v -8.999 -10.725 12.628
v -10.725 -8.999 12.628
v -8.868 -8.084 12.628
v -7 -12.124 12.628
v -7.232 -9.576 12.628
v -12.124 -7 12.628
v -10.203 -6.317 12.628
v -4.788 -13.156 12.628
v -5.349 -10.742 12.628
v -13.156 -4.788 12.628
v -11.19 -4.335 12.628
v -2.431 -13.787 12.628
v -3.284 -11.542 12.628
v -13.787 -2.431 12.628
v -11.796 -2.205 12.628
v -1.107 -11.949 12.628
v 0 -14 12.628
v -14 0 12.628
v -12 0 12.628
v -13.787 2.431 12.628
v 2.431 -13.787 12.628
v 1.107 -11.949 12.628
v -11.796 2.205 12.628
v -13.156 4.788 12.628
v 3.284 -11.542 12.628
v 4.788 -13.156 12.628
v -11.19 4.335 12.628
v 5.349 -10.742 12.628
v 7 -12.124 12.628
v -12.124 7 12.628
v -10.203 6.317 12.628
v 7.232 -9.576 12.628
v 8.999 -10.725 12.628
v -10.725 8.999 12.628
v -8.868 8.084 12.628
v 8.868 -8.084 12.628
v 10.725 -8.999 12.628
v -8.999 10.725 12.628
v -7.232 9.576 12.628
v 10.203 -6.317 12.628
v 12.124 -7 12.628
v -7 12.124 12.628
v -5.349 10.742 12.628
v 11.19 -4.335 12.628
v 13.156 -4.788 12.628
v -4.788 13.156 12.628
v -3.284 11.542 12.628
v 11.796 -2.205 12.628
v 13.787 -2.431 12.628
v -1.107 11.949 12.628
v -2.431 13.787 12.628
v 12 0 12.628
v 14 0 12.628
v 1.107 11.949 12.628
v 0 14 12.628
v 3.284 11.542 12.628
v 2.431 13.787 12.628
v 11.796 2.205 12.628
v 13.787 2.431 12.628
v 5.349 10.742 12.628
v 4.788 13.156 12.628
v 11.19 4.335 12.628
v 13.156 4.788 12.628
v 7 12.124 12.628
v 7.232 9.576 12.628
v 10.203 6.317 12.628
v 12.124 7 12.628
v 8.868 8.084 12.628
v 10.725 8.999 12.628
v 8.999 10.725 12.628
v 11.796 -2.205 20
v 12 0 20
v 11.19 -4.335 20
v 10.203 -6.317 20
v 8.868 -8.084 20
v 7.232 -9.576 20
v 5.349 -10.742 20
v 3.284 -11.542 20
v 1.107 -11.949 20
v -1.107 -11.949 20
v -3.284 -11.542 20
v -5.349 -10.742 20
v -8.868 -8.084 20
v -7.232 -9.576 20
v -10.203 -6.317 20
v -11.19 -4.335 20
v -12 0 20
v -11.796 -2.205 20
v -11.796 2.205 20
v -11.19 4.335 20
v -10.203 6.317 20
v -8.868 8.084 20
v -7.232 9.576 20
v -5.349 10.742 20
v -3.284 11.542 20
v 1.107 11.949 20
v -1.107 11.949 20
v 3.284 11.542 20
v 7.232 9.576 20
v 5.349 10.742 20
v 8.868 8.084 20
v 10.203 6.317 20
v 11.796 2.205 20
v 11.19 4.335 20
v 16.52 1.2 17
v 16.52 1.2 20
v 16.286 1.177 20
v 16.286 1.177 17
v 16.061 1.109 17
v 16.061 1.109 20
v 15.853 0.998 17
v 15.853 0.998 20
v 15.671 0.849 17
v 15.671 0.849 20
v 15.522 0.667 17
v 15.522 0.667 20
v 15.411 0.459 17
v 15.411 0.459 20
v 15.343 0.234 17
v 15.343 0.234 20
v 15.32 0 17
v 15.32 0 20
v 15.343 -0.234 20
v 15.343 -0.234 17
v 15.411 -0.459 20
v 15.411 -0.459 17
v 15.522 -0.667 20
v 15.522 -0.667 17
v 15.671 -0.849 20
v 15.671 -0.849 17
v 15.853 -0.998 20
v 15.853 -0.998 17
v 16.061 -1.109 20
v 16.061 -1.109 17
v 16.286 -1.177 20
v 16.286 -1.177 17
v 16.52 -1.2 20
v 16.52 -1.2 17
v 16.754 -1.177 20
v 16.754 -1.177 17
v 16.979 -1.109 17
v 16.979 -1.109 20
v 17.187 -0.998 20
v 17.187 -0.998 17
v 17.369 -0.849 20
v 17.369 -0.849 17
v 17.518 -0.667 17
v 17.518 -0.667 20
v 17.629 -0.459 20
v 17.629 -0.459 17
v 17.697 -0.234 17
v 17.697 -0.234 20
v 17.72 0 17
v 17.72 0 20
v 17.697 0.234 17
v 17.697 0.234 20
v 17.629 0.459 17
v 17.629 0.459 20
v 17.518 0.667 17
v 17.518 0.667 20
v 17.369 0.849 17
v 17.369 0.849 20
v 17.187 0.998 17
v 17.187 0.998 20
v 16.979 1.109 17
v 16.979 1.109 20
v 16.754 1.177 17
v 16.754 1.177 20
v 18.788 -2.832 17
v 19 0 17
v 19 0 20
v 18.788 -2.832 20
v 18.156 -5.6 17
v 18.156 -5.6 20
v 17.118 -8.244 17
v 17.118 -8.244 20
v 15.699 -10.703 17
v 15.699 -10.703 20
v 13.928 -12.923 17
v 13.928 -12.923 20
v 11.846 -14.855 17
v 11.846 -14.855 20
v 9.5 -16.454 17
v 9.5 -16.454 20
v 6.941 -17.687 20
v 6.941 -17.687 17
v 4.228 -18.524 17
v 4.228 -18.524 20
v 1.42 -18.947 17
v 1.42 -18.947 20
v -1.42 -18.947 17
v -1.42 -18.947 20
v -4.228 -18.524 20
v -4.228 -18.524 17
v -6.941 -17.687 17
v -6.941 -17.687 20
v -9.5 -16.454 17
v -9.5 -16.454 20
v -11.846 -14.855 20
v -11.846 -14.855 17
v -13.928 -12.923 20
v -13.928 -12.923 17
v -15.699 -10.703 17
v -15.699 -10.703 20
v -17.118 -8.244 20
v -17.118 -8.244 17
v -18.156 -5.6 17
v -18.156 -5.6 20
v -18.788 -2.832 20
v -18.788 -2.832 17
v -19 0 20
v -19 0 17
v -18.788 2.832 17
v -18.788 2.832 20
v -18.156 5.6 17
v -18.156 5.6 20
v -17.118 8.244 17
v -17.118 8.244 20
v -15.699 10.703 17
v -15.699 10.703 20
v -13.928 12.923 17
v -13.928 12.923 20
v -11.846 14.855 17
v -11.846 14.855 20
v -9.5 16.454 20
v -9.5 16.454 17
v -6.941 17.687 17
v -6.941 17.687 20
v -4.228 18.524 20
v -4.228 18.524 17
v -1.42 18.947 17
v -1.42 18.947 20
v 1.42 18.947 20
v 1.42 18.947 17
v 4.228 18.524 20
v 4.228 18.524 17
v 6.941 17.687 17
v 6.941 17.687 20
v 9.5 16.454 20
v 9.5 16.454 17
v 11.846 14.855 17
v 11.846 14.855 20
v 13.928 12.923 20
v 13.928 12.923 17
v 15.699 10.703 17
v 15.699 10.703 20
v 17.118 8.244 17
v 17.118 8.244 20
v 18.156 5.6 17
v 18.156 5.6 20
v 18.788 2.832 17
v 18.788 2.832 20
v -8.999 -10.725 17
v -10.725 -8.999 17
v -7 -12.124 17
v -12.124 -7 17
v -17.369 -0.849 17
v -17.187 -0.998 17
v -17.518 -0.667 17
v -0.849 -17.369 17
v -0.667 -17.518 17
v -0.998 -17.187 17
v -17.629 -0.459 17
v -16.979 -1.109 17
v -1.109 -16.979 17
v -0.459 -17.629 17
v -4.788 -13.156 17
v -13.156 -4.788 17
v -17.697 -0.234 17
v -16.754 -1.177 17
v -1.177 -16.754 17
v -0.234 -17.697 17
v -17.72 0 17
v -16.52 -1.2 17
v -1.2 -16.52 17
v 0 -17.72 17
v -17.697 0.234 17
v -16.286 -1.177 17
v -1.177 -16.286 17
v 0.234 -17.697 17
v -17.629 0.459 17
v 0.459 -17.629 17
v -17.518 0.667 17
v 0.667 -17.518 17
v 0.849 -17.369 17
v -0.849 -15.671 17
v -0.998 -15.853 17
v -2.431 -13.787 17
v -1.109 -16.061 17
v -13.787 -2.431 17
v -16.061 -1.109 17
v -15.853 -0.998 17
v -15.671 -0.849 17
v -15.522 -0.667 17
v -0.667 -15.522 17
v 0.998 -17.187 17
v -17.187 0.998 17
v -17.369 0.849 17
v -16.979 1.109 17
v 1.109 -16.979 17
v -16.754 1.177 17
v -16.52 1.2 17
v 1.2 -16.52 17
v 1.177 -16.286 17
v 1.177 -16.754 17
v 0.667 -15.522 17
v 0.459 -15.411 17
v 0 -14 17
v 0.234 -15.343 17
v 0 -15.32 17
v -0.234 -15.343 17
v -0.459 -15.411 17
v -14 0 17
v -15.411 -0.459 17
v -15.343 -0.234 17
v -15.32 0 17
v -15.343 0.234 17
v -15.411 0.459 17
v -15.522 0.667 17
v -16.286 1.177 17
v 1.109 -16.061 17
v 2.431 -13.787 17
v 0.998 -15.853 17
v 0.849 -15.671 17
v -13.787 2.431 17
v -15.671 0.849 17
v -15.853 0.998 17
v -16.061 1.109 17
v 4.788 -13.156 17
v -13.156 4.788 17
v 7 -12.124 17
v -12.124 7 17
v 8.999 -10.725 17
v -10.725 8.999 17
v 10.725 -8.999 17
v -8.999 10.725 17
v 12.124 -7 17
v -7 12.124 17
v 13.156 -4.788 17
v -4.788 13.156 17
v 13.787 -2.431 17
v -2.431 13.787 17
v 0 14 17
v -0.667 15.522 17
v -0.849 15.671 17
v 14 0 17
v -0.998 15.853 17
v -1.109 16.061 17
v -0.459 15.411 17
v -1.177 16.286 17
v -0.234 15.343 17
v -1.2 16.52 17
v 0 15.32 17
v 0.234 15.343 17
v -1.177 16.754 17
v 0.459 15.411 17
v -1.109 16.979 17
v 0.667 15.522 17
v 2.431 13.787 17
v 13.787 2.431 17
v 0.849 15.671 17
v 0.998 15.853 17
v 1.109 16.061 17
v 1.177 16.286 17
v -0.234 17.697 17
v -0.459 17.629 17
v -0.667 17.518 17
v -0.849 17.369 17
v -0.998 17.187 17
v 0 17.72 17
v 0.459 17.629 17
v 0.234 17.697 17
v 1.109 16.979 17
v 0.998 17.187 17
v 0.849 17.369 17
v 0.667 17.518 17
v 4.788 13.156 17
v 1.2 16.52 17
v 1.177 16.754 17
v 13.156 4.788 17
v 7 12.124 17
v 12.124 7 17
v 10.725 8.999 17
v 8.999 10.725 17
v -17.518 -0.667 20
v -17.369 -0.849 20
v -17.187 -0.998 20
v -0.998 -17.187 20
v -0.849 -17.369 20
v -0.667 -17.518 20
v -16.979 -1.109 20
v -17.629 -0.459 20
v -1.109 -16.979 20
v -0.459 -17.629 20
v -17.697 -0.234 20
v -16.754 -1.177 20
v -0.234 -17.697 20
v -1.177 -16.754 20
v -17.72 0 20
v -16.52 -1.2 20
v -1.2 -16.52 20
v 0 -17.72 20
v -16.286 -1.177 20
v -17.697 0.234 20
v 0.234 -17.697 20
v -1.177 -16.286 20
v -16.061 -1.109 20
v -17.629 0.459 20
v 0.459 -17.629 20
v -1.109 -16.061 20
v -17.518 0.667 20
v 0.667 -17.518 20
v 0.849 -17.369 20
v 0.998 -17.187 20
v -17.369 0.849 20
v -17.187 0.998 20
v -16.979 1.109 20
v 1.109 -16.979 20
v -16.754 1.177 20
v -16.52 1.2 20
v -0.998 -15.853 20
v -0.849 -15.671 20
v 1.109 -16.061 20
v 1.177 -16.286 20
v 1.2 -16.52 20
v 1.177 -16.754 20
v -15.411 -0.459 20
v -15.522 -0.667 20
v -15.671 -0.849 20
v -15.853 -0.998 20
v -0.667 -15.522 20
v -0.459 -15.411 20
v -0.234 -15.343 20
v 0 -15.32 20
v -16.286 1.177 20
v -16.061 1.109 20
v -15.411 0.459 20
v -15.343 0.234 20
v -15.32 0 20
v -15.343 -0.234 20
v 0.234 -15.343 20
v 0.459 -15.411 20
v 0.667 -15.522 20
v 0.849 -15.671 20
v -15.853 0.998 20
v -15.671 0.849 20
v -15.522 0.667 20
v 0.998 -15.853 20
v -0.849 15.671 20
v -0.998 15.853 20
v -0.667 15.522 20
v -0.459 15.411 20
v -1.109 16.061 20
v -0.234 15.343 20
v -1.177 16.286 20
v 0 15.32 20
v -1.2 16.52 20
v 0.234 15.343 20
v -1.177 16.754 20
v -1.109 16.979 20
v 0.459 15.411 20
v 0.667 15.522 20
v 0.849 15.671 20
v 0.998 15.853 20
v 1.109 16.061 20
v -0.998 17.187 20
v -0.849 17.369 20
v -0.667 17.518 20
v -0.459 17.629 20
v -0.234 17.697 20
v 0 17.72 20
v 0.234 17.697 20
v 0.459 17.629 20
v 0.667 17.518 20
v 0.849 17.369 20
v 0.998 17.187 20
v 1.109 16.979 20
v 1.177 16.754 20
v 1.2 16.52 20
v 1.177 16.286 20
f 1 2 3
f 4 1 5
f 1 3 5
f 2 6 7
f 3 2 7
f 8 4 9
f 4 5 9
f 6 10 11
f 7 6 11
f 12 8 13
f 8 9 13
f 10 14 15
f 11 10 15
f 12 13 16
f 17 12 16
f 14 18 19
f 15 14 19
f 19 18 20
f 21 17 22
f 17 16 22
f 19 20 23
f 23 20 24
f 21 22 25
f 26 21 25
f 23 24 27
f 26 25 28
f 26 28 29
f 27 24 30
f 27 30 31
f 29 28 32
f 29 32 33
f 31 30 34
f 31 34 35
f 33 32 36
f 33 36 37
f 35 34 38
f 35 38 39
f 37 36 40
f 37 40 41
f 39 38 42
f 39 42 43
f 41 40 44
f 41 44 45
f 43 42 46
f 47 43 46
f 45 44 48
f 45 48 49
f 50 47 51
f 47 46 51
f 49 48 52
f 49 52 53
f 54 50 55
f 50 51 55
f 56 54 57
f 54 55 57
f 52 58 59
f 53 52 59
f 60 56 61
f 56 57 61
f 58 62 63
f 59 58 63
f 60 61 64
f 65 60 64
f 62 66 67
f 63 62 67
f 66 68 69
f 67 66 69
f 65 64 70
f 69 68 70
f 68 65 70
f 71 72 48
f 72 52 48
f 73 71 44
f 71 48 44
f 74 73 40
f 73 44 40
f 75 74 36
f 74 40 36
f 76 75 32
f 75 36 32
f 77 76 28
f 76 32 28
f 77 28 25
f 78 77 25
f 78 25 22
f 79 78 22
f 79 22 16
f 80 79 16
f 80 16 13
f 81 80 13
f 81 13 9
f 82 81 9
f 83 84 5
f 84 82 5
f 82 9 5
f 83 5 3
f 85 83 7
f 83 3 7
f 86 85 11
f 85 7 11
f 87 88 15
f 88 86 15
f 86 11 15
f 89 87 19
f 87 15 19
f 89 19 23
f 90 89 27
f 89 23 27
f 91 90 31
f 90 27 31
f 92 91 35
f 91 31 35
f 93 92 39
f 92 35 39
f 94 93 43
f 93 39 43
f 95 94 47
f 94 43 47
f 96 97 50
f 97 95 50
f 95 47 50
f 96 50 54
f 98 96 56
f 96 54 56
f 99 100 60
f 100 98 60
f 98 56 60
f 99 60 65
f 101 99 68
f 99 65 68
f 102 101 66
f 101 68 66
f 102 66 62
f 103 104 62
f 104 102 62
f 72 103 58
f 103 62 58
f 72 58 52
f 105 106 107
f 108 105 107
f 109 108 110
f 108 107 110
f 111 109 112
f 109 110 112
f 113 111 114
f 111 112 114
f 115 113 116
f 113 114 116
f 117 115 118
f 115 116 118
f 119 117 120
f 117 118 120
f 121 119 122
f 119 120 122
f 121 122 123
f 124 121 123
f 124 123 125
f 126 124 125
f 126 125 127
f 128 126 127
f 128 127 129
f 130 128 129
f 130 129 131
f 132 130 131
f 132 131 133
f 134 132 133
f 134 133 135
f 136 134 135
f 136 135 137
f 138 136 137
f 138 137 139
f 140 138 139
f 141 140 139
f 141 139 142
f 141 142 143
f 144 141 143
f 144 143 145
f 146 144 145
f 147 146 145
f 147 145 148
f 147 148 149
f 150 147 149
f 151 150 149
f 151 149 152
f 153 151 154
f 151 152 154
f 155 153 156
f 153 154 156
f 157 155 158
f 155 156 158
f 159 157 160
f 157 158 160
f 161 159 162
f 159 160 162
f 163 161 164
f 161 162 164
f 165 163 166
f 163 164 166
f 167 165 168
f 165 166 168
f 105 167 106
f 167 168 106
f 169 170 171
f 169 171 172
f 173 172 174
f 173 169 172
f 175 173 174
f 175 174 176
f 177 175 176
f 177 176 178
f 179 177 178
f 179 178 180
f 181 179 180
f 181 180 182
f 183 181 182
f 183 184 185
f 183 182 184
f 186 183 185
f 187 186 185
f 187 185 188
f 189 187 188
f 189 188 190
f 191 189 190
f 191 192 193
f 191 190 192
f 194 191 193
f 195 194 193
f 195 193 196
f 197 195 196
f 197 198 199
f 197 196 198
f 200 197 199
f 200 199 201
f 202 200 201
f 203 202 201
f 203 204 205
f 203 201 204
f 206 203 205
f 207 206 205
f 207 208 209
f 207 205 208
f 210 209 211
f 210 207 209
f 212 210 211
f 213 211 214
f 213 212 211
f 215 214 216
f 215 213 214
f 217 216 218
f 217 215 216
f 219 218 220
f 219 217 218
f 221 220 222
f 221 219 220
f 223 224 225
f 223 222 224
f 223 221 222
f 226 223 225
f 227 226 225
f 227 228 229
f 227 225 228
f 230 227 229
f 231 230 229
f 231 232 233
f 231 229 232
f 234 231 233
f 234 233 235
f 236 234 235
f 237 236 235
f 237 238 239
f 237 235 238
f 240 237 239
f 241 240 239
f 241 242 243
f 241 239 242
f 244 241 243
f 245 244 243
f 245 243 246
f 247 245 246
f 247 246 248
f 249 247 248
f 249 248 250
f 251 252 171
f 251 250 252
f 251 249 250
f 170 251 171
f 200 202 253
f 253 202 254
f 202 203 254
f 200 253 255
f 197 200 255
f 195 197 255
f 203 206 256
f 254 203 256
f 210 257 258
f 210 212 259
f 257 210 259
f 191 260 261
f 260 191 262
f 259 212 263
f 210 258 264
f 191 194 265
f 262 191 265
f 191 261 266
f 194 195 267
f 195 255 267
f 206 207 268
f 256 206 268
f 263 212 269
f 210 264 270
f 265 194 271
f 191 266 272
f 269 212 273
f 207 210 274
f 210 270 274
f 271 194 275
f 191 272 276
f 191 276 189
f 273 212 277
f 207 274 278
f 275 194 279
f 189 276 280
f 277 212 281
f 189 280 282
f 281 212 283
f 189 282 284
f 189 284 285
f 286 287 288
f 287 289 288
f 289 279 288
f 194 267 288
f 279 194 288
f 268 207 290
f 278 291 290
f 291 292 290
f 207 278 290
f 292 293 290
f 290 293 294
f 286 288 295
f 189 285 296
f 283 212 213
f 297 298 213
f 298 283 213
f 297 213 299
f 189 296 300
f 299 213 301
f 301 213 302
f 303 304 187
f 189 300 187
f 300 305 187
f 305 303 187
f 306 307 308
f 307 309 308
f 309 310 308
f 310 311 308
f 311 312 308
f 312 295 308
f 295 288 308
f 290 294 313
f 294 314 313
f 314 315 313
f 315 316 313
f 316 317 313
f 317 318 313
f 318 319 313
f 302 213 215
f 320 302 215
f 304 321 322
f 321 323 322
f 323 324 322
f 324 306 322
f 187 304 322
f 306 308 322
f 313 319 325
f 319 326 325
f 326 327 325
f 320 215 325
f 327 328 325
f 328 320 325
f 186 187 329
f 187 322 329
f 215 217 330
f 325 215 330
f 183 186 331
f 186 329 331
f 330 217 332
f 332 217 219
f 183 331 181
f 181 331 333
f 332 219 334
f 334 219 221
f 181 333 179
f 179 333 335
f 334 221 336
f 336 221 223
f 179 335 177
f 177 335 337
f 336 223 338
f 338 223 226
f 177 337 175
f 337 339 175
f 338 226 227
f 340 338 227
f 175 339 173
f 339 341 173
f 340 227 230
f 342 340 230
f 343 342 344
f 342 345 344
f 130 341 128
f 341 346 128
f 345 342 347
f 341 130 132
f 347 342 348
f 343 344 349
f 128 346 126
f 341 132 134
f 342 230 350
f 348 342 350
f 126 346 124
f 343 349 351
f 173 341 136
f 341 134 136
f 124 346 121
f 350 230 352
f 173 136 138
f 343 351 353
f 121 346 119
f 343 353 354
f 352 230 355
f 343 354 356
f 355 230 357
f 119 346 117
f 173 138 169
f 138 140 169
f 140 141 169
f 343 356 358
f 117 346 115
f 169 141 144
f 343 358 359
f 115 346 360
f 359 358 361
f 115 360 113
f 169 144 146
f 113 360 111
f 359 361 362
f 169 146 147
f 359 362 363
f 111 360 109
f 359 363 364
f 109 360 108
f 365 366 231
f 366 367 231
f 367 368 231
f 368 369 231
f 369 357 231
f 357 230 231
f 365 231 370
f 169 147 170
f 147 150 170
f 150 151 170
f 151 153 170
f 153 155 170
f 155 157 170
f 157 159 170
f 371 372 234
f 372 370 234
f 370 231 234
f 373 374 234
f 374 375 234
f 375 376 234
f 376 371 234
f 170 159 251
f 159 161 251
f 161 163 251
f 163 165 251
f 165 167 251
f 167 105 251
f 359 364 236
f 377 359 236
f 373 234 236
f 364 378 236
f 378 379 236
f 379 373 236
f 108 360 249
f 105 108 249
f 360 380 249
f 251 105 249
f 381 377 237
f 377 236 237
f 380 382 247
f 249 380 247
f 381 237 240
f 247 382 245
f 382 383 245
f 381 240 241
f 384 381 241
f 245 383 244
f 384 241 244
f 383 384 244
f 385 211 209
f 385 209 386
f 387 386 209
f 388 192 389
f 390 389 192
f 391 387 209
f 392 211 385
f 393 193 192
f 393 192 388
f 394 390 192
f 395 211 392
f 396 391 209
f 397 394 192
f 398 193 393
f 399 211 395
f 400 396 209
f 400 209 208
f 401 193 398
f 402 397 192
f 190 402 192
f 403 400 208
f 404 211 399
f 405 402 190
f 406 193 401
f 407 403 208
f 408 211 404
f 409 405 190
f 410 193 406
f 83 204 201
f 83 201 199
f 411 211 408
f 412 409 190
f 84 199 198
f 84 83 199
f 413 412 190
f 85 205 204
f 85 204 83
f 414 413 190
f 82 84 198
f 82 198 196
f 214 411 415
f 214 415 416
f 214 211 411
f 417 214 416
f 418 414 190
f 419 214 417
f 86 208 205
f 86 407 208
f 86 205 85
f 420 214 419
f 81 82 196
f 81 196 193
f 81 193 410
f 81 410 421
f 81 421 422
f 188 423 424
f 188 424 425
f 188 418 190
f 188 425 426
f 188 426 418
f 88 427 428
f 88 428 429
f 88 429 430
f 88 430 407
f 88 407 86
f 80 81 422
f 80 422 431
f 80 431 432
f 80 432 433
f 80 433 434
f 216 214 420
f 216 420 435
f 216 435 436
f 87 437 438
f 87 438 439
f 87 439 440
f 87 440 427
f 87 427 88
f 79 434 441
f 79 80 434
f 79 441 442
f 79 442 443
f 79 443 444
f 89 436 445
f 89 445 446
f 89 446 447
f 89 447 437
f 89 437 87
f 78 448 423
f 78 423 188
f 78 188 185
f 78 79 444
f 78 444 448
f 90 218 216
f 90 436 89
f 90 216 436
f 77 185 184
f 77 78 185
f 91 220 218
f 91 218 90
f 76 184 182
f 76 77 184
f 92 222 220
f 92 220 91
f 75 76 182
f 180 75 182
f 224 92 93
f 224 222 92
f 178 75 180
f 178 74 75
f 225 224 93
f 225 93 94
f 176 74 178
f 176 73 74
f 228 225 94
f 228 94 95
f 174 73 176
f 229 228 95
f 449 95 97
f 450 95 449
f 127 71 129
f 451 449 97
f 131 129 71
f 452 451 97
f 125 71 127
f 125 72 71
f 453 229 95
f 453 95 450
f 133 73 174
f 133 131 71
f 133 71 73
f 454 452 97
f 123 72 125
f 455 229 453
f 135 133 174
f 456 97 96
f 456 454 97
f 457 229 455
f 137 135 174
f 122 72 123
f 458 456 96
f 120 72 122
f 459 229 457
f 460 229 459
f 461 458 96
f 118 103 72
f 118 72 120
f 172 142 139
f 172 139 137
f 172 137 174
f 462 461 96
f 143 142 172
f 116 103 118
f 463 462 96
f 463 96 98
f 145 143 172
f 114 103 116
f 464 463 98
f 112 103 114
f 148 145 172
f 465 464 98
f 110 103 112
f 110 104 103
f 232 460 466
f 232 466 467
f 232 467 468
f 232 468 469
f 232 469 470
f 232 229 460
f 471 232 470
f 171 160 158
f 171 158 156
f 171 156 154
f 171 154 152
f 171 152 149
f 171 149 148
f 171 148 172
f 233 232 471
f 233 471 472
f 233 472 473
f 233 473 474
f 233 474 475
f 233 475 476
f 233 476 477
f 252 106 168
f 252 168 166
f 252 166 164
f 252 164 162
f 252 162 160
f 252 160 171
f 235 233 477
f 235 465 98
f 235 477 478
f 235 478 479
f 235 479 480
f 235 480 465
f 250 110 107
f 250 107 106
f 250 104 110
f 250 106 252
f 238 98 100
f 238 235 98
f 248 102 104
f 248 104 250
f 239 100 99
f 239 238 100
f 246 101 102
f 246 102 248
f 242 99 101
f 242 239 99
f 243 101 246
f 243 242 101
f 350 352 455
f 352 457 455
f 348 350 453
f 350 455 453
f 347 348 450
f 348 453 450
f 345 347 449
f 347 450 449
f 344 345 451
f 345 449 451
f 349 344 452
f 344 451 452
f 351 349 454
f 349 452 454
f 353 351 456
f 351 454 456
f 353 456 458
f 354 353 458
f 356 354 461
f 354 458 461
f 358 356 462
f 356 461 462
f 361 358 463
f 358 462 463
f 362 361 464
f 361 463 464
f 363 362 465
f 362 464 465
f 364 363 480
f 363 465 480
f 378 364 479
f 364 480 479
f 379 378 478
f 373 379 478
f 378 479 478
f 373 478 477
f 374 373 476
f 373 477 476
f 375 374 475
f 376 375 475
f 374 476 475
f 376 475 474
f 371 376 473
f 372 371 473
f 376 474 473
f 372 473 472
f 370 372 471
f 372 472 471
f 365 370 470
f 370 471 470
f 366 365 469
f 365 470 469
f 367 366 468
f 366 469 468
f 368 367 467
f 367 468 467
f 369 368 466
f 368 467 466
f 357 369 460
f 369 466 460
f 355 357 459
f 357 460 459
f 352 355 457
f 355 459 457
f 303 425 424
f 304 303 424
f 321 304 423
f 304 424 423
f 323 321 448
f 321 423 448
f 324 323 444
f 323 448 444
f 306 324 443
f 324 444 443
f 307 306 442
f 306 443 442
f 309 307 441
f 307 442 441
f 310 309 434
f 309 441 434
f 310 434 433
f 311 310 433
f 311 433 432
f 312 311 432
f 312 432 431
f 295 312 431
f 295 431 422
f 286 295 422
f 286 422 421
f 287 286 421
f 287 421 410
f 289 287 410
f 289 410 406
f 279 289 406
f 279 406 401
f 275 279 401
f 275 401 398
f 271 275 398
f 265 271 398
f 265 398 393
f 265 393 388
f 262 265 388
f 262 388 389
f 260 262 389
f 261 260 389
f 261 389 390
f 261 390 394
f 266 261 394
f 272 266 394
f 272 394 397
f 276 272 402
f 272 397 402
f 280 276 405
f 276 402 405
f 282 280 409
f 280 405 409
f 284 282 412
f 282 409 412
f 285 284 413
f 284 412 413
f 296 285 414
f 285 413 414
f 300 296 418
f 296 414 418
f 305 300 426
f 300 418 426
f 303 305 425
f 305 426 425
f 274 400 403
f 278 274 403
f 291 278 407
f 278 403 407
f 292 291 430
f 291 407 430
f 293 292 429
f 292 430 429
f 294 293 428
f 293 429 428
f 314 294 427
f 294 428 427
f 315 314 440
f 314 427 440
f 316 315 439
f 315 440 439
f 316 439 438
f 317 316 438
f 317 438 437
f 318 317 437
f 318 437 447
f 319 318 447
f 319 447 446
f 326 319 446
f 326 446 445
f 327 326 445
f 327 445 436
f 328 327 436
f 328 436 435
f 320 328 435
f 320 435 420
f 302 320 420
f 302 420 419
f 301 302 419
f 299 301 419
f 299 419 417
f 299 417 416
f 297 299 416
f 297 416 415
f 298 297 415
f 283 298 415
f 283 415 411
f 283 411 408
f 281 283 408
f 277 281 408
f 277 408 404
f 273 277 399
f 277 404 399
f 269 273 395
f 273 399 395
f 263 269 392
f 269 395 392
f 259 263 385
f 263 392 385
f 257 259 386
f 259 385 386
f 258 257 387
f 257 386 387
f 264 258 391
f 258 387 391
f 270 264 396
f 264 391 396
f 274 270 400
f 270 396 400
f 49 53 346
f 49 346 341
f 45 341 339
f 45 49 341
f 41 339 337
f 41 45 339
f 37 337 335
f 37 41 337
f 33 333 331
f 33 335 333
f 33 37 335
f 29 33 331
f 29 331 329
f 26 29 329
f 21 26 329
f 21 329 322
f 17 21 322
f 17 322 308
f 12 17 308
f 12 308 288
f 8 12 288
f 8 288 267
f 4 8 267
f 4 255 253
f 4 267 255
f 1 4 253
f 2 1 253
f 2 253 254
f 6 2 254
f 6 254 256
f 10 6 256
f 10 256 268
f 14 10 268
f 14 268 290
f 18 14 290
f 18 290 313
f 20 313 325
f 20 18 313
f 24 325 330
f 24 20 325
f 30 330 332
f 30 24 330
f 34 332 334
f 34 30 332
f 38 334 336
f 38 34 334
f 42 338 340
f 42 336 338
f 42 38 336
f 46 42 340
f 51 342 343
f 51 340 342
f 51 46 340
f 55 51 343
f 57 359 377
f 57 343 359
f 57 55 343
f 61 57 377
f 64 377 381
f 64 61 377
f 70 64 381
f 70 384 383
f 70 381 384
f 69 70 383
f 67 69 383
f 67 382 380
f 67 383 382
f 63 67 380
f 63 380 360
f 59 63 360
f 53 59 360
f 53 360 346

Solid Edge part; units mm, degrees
sketch "Sketch1" plane through (0, 0, 0) normal (0, -1, 0) x (1, 0, 0)
  line L0 (19, 17) -> (14, 17)
  line L1 (14, 17) -> (14, 12.6275)
  line L2 (14, 12.6275) -> (12, 12.6275)
  line L3 (12, 20) -> (12, 12.6275)
  line L4 (12, 20) -> (19, 20)
  line L5 (19, 20) -> (19, 17)
revolve "RevolvedProtrusion1" add sketch "Sketch1" angle 360 about axis through (0, 0, 11.8307) along (0, 0, 1)
hole "Hole1" at (-16.52, 0, 20) direction (0, 0, -1) diameter 2.4 end through all
pattern_circular "Pattern1" count 4 over 360 about axis through (0, 0, 20) along (0, 0, -1) of "Hole1"
cosmetic_thread "Thread1" size "Tr26 x 2"
